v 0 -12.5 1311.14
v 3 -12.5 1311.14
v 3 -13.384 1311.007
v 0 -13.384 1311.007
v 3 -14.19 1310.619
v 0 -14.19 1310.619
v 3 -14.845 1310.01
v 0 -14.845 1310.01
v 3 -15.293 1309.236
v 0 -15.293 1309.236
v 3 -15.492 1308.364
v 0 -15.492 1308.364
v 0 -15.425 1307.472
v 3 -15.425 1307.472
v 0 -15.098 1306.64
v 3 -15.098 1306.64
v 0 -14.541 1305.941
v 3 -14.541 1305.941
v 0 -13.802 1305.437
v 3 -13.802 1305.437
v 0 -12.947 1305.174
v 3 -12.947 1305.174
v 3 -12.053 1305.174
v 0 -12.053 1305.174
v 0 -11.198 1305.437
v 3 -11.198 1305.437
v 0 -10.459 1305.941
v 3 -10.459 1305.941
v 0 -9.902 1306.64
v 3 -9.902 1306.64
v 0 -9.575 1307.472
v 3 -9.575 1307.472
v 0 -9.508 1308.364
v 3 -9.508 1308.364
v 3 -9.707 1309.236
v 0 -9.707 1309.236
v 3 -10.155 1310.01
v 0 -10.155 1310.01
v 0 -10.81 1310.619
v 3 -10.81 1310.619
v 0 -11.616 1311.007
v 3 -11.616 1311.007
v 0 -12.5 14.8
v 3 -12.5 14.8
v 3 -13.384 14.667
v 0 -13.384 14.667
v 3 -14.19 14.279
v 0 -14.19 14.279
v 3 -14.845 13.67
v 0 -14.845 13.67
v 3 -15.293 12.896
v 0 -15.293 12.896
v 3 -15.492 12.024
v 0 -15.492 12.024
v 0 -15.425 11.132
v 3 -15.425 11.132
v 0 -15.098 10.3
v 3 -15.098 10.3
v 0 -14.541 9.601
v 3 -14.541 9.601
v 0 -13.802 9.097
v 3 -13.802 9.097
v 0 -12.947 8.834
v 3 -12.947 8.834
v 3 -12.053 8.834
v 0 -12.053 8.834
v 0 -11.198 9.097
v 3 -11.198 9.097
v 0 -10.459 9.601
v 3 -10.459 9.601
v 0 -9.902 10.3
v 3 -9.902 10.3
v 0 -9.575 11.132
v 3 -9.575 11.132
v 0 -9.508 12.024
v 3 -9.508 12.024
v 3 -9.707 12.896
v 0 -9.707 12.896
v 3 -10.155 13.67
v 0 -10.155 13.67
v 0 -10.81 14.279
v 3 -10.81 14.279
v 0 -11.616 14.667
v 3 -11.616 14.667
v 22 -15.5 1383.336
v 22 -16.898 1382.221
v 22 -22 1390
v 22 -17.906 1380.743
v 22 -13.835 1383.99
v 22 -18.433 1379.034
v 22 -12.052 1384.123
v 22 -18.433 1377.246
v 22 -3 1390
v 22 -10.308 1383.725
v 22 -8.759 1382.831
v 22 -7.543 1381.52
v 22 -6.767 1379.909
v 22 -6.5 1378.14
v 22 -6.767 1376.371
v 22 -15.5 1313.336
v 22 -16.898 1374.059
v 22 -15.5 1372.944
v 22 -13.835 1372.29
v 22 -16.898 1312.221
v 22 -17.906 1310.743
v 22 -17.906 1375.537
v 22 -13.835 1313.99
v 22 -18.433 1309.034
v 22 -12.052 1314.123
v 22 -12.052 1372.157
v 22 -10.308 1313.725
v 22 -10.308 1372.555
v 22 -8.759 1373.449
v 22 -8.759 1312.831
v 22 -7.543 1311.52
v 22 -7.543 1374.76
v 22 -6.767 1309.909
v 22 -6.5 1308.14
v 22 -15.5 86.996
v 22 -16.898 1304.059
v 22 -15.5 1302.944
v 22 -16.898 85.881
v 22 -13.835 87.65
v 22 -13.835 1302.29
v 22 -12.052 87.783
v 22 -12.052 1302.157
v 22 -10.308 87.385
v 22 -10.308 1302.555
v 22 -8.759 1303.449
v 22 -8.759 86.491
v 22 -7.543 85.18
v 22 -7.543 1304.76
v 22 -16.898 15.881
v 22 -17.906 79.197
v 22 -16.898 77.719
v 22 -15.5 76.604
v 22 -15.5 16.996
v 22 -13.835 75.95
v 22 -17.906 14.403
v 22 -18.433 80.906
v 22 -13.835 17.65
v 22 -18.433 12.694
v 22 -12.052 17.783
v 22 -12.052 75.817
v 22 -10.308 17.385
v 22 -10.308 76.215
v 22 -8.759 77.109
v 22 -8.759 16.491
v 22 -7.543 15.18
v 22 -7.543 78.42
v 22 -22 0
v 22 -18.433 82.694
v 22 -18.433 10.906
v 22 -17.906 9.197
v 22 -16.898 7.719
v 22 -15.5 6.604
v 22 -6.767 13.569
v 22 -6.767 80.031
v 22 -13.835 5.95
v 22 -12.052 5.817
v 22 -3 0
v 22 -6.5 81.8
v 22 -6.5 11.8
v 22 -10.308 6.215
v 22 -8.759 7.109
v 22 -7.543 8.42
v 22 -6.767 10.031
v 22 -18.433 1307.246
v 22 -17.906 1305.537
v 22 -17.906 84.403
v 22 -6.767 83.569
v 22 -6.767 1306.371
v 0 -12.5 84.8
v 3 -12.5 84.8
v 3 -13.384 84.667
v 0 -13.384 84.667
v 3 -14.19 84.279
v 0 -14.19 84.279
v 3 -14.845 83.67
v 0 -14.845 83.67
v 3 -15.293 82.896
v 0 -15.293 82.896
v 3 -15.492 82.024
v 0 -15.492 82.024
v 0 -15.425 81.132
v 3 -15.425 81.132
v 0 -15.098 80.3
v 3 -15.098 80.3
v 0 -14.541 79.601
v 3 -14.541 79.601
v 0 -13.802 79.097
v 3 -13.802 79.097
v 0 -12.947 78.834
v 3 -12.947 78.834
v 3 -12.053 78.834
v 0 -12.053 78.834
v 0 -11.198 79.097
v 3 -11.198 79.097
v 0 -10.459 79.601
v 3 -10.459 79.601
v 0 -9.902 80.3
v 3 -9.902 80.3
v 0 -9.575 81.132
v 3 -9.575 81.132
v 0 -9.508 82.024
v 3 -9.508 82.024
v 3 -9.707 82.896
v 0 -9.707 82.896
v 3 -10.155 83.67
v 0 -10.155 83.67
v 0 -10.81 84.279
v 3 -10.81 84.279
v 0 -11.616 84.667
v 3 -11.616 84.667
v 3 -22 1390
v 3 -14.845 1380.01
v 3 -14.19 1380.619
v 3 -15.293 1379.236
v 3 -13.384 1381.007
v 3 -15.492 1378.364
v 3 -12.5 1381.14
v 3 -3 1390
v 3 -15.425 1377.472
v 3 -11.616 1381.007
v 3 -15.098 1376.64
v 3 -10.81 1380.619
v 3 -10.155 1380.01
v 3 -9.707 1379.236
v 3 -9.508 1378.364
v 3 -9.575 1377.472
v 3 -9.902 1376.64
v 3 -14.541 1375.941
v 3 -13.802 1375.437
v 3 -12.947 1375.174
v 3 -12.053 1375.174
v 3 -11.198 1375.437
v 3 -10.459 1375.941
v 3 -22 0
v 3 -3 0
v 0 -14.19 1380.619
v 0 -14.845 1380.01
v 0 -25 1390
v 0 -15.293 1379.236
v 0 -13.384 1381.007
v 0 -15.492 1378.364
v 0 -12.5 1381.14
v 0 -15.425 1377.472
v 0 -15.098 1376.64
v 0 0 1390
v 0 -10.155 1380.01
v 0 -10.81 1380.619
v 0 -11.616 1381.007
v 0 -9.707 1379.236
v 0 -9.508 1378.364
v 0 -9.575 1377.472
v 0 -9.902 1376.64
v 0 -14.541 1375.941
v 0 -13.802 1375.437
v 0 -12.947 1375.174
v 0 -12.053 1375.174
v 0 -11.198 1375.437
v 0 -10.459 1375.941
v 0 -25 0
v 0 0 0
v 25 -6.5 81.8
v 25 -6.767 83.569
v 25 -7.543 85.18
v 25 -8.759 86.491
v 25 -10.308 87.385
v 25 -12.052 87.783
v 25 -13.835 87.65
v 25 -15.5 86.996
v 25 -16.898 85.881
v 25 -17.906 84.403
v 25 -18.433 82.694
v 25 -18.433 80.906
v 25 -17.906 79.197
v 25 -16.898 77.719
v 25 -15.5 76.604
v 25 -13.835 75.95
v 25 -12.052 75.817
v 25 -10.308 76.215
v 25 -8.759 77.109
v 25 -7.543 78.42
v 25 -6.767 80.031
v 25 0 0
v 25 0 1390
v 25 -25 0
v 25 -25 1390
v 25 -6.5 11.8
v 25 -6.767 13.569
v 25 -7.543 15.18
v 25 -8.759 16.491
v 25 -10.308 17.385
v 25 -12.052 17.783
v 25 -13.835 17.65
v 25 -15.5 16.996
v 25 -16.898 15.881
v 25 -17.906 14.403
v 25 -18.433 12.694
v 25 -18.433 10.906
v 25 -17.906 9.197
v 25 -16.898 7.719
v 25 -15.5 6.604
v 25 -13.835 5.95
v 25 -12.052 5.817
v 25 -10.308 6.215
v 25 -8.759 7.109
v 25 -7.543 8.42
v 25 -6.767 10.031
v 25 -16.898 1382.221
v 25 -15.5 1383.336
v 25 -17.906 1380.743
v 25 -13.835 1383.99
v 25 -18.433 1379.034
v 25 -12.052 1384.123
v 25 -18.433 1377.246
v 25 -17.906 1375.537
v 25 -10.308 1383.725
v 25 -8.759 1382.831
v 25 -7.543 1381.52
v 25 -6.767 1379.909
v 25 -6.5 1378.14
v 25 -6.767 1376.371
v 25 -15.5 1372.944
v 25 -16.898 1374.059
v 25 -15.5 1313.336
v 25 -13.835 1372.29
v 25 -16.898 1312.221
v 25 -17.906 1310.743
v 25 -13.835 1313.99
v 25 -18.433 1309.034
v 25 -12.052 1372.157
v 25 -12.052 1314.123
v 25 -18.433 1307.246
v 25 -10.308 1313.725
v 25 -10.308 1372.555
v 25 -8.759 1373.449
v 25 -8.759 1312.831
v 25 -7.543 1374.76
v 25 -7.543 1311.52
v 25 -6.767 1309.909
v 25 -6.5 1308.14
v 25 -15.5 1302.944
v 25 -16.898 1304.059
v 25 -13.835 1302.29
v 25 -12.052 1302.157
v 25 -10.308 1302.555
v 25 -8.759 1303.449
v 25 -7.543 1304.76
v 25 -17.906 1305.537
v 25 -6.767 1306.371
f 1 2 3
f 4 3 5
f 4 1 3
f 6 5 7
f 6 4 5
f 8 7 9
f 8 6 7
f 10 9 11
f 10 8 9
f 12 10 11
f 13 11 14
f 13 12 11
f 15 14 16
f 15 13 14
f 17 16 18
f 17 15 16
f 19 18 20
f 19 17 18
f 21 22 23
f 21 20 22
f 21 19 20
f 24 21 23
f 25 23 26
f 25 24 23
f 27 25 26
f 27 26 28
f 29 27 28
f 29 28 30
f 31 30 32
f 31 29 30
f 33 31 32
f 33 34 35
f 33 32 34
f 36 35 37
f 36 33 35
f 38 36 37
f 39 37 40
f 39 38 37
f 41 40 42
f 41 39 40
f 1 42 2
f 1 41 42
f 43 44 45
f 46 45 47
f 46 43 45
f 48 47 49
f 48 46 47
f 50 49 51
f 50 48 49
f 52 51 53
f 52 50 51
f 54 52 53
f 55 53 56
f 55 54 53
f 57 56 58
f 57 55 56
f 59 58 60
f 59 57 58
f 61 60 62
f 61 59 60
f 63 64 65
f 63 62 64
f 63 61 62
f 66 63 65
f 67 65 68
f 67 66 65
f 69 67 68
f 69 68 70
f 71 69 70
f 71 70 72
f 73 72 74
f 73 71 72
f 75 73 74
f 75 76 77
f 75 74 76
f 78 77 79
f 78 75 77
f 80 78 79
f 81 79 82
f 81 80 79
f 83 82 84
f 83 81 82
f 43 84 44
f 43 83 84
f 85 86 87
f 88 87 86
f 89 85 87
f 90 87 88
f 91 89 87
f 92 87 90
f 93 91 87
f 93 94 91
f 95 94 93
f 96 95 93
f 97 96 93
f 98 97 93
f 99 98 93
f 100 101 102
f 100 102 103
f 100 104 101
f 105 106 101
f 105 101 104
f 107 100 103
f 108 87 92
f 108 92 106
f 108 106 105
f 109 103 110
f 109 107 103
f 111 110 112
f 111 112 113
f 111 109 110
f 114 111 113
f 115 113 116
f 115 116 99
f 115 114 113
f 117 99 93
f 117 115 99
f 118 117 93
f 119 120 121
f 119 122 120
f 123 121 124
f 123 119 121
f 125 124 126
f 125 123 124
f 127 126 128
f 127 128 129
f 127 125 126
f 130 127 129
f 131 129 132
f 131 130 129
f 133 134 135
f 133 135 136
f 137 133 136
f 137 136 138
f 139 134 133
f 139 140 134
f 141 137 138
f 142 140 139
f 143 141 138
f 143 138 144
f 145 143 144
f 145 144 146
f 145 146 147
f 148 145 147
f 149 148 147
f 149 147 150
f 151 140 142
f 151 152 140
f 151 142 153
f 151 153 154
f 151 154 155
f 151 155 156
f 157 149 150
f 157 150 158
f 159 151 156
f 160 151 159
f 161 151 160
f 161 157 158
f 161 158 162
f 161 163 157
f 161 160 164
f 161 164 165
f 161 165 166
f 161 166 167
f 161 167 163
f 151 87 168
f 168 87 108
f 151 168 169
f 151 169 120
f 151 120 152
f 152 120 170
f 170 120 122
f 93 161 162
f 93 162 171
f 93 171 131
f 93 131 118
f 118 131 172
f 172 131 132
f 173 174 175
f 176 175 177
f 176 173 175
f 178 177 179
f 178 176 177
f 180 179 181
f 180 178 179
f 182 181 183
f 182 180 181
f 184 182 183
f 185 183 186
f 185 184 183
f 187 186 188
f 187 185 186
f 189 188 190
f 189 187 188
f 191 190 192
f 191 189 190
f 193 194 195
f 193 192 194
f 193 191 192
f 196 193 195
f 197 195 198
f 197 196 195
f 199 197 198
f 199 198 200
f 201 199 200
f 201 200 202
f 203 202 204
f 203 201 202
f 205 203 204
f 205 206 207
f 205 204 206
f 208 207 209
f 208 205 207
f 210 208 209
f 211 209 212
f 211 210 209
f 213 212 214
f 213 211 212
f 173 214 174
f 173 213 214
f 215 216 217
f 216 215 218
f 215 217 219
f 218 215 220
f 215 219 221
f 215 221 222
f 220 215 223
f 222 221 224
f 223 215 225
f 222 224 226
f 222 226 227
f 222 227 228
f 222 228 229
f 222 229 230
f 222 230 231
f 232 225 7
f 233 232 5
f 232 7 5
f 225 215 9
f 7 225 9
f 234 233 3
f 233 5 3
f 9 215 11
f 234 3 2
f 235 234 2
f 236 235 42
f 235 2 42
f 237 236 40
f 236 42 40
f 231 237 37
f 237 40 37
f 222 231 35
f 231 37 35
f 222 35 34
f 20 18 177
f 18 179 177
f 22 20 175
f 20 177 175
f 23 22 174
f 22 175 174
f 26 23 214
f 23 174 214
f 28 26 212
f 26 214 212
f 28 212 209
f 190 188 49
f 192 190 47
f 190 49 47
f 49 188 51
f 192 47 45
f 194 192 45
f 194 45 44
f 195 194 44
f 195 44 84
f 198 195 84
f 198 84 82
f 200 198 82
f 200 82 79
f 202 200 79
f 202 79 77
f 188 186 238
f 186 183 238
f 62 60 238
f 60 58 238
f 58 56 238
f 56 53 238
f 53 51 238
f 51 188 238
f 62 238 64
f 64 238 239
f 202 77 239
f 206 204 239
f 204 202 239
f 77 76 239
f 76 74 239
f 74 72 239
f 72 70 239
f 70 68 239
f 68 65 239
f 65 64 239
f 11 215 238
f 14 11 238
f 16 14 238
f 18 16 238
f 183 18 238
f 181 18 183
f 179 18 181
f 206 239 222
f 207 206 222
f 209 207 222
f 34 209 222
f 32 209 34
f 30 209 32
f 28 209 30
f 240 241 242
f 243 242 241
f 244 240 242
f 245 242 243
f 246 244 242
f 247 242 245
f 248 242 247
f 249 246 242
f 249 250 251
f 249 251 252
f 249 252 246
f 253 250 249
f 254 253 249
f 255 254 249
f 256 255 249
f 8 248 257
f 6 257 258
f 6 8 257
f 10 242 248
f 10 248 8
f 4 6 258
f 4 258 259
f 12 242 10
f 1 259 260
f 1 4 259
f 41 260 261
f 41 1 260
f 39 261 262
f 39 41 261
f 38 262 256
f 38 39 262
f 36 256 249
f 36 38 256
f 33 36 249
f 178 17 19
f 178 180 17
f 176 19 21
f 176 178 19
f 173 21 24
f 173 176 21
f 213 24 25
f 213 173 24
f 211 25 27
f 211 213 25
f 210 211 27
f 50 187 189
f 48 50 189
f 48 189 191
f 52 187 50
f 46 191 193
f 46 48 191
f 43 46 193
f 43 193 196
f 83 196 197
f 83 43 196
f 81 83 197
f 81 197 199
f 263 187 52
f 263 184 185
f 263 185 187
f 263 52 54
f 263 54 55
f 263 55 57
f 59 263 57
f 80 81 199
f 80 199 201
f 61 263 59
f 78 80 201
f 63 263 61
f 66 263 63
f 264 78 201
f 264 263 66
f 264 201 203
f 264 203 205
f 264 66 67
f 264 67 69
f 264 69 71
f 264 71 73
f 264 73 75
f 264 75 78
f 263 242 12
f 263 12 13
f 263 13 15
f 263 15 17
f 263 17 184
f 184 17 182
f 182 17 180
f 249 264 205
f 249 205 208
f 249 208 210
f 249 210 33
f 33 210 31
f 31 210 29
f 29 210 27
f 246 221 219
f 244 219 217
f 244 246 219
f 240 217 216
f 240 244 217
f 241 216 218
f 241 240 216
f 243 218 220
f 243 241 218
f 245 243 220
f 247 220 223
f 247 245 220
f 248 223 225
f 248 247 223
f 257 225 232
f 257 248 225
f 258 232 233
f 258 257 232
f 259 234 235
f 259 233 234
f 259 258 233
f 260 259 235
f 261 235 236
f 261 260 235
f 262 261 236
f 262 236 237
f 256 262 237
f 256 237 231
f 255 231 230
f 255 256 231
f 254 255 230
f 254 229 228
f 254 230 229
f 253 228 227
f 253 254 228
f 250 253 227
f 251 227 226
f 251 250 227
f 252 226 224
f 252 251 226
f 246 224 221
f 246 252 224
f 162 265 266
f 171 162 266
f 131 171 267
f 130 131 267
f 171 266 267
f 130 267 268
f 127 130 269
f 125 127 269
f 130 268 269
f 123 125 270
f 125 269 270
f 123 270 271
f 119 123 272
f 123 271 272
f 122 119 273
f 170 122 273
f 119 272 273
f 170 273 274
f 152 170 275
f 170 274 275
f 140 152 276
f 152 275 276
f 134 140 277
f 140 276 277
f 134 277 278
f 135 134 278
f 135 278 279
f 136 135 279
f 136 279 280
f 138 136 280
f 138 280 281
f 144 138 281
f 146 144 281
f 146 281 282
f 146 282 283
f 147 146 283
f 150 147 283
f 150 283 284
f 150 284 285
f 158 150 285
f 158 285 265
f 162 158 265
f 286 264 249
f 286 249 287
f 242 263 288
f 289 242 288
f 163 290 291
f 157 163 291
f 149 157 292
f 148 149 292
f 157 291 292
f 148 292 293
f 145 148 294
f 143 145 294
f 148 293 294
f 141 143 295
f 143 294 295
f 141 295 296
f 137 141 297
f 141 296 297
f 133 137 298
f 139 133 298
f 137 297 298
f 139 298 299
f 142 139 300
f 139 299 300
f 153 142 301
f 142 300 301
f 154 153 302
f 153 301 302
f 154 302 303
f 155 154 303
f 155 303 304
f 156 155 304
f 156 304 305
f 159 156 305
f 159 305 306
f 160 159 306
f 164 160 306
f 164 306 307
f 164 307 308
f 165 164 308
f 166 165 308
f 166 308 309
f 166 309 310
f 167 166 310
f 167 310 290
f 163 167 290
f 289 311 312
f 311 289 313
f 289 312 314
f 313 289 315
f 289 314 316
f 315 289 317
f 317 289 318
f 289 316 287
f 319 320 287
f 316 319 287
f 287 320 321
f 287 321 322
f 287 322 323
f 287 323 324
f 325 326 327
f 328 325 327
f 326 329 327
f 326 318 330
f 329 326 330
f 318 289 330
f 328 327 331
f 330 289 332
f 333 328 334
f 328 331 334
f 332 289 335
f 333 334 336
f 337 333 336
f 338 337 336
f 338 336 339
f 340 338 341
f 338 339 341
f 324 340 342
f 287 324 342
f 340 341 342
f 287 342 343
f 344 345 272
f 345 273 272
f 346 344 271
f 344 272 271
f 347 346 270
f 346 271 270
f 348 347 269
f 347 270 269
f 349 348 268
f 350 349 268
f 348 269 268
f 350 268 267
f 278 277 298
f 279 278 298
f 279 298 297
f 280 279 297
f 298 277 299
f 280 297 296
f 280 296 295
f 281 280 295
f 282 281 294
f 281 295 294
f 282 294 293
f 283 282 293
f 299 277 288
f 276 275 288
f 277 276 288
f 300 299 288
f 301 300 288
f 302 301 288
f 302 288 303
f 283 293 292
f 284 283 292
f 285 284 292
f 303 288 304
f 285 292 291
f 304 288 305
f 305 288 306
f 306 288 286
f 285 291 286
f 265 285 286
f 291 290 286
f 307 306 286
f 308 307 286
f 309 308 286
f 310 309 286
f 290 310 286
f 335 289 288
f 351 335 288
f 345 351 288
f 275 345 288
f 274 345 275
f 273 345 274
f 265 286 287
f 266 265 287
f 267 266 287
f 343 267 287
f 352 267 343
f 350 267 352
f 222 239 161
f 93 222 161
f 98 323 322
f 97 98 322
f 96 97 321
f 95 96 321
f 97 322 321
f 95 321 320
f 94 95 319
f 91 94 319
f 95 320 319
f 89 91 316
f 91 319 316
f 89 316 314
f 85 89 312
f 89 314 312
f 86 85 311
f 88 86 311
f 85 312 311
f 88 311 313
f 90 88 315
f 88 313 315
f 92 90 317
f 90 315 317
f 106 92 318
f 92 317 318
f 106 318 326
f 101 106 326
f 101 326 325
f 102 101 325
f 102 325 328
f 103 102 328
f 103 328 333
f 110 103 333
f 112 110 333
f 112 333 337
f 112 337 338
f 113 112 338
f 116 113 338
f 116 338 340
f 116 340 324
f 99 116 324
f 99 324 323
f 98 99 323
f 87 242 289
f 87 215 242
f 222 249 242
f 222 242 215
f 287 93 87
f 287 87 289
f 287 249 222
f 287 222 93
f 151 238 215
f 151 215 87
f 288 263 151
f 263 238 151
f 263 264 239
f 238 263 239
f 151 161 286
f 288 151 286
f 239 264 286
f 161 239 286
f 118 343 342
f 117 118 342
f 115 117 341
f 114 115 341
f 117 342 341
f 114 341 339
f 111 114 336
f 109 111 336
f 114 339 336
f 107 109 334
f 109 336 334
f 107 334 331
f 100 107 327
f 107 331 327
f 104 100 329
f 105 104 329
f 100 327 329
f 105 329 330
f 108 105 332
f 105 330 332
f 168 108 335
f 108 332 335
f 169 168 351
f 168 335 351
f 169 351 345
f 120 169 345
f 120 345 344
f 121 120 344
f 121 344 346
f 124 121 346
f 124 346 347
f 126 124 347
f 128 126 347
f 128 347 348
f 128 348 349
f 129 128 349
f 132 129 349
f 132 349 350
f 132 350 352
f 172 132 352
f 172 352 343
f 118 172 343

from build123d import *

# Parameters (mm, degrees)
SKETCH_1_W                     = 25
SKETCH_1_H                     = 25
SKETCH_1_W_2                   = 19
SKETCH_1_H_2                   = 19
EXTRUDE_1_DEPTH                = 1390
HOLE_WIZARD_6_0_6_1_AT_2_COUNT = 2
HOLE_WIZARD_6_0_6_1_AT_2_PITCH = 70
CUT_EXTRUDE_1_REACH            = 1392.45
SKETCH_6_R                     = 6
PATTERN_LINEAR_1_COUNT         = 2
PATTERN_LINEAR_1_PITCH         = 1296.34


with BuildPart() as part:
    # 草图1 → 拉伸1 (new body)
    with BuildSketch(Plane.XY):
        with Locations((12.5, -12.5)):
            Rectangle(SKETCH_1_W, SKETCH_1_H)
        with Locations((12.5, -12.5)):
            Rectangle(SKETCH_1_W_2, SKETCH_1_H_2, mode=Mode.SUBTRACT)
    extrude(amount=EXTRUDE_1_DEPTH)

    # 草图4 → Ø6.0 (6) 直径孔1 (revolve, cut)
    with BuildSketch(Plane(origin=(0, -12.5, 11.8), x_dir=(0, 0, 1), z_dir=(0, 1, 0))):
        Polygon((0, 0), (0, 31.802581857), (3, 30), (3, 0), align=None)
    hole_wizard_6_0_6_1 = revolve(axis=Axis((-6.35, -12.5, 11.8), (1, 0, 0)), mode=Mode.SUBTRACT)

    # Ø6.0 (6) 直径孔1 at 2: Ø6.0 (6) 直径孔1 ×2
    with Locations(*[(0, 0, i * HOLE_WIZARD_6_0_6_1_AT_2_PITCH) for i in range(1, HOLE_WIZARD_6_0_6_1_AT_2_COUNT)]):
        add(hole_wizard_6_0_6_1, mode=Mode.SUBTRACT)

    # 草图6 → 切除-拉伸1 (cut, up to next)
    with BuildSketch(Plane(origin=(25, 0, 0), x_dir=(0, 0, -1), z_dir=(1, 0, 0)), mode=Mode.PRIVATE) as cut_extrude_1_sk1:
        with Locations(Location((-11.8, -12.5, 0), (0, 0, 90))):
            Circle(SKETCH_6_R)
    cut_extrude_1_tool1 = extrude(cut_extrude_1_sk1.sketch, amount=-CUT_EXTRUDE_1_REACH, mode=Mode.PRIVATE) & part.part
    # 草图6 → 切除-拉伸1 (cut, up to next)
    with BuildSketch(Plane(origin=(25, 0, 0), x_dir=(0, 0, -1), z_dir=(1, 0, 0)), mode=Mode.PRIVATE) as cut_extrude_1_sk2:
        with Locations(Location((-81.8, -12.5, 0), (0, 0, 90))):
            Circle(SKETCH_6_R)
    cut_extrude_1_tool2 = extrude(cut_extrude_1_sk2.sketch, amount=-CUT_EXTRUDE_1_REACH, mode=Mode.PRIVATE) & part.part
    cut_extrude_1_1 = cut_extrude_1_tool1.solids().sort_by_distance((25, -12.5, 11.8))[0]
    add(cut_extrude_1_1, mode=Mode.SUBTRACT)
    cut_extrude_1_2 = cut_extrude_1_tool2.solids().sort_by_distance((25, -12.5, 81.8))[0]
    add(cut_extrude_1_2, mode=Mode.SUBTRACT)
    cut_extrude_1 = cut_extrude_1_1 + cut_extrude_1_2  # 切除-拉伸1 as one shape, for the pattern or mirror that repeats it

    # 阵列(线性)1: Ø6.0 (6) 直径孔1, 切除-拉伸1 ×2
    with Locations(*[(0, 0, i * PATTERN_LINEAR_1_PITCH) for i in range(1, PATTERN_LINEAR_1_COUNT)]):
        add(hole_wizard_6_0_6_1, mode=Mode.SUBTRACT)
        add(cut_extrude_1, mode=Mode.SUBTRACT)

    # 阵列(线性)1 copy 1 sketch → 阵列(线性)1 copy 1 (revolve, cut)
    with BuildSketch(Plane(origin=(0, -12.5, 1378.14), x_dir=(0, 0, 1), z_dir=(0, 1, 0))):
        Polygon((0, 0), (0, 31.802581857), (3, 30), (3, 0), align=None)
    revolve(axis=Axis((-6.35, -12.5, 1378.14), (1, 0, 0)), mode=Mode.SUBTRACT)


solid = part.part
